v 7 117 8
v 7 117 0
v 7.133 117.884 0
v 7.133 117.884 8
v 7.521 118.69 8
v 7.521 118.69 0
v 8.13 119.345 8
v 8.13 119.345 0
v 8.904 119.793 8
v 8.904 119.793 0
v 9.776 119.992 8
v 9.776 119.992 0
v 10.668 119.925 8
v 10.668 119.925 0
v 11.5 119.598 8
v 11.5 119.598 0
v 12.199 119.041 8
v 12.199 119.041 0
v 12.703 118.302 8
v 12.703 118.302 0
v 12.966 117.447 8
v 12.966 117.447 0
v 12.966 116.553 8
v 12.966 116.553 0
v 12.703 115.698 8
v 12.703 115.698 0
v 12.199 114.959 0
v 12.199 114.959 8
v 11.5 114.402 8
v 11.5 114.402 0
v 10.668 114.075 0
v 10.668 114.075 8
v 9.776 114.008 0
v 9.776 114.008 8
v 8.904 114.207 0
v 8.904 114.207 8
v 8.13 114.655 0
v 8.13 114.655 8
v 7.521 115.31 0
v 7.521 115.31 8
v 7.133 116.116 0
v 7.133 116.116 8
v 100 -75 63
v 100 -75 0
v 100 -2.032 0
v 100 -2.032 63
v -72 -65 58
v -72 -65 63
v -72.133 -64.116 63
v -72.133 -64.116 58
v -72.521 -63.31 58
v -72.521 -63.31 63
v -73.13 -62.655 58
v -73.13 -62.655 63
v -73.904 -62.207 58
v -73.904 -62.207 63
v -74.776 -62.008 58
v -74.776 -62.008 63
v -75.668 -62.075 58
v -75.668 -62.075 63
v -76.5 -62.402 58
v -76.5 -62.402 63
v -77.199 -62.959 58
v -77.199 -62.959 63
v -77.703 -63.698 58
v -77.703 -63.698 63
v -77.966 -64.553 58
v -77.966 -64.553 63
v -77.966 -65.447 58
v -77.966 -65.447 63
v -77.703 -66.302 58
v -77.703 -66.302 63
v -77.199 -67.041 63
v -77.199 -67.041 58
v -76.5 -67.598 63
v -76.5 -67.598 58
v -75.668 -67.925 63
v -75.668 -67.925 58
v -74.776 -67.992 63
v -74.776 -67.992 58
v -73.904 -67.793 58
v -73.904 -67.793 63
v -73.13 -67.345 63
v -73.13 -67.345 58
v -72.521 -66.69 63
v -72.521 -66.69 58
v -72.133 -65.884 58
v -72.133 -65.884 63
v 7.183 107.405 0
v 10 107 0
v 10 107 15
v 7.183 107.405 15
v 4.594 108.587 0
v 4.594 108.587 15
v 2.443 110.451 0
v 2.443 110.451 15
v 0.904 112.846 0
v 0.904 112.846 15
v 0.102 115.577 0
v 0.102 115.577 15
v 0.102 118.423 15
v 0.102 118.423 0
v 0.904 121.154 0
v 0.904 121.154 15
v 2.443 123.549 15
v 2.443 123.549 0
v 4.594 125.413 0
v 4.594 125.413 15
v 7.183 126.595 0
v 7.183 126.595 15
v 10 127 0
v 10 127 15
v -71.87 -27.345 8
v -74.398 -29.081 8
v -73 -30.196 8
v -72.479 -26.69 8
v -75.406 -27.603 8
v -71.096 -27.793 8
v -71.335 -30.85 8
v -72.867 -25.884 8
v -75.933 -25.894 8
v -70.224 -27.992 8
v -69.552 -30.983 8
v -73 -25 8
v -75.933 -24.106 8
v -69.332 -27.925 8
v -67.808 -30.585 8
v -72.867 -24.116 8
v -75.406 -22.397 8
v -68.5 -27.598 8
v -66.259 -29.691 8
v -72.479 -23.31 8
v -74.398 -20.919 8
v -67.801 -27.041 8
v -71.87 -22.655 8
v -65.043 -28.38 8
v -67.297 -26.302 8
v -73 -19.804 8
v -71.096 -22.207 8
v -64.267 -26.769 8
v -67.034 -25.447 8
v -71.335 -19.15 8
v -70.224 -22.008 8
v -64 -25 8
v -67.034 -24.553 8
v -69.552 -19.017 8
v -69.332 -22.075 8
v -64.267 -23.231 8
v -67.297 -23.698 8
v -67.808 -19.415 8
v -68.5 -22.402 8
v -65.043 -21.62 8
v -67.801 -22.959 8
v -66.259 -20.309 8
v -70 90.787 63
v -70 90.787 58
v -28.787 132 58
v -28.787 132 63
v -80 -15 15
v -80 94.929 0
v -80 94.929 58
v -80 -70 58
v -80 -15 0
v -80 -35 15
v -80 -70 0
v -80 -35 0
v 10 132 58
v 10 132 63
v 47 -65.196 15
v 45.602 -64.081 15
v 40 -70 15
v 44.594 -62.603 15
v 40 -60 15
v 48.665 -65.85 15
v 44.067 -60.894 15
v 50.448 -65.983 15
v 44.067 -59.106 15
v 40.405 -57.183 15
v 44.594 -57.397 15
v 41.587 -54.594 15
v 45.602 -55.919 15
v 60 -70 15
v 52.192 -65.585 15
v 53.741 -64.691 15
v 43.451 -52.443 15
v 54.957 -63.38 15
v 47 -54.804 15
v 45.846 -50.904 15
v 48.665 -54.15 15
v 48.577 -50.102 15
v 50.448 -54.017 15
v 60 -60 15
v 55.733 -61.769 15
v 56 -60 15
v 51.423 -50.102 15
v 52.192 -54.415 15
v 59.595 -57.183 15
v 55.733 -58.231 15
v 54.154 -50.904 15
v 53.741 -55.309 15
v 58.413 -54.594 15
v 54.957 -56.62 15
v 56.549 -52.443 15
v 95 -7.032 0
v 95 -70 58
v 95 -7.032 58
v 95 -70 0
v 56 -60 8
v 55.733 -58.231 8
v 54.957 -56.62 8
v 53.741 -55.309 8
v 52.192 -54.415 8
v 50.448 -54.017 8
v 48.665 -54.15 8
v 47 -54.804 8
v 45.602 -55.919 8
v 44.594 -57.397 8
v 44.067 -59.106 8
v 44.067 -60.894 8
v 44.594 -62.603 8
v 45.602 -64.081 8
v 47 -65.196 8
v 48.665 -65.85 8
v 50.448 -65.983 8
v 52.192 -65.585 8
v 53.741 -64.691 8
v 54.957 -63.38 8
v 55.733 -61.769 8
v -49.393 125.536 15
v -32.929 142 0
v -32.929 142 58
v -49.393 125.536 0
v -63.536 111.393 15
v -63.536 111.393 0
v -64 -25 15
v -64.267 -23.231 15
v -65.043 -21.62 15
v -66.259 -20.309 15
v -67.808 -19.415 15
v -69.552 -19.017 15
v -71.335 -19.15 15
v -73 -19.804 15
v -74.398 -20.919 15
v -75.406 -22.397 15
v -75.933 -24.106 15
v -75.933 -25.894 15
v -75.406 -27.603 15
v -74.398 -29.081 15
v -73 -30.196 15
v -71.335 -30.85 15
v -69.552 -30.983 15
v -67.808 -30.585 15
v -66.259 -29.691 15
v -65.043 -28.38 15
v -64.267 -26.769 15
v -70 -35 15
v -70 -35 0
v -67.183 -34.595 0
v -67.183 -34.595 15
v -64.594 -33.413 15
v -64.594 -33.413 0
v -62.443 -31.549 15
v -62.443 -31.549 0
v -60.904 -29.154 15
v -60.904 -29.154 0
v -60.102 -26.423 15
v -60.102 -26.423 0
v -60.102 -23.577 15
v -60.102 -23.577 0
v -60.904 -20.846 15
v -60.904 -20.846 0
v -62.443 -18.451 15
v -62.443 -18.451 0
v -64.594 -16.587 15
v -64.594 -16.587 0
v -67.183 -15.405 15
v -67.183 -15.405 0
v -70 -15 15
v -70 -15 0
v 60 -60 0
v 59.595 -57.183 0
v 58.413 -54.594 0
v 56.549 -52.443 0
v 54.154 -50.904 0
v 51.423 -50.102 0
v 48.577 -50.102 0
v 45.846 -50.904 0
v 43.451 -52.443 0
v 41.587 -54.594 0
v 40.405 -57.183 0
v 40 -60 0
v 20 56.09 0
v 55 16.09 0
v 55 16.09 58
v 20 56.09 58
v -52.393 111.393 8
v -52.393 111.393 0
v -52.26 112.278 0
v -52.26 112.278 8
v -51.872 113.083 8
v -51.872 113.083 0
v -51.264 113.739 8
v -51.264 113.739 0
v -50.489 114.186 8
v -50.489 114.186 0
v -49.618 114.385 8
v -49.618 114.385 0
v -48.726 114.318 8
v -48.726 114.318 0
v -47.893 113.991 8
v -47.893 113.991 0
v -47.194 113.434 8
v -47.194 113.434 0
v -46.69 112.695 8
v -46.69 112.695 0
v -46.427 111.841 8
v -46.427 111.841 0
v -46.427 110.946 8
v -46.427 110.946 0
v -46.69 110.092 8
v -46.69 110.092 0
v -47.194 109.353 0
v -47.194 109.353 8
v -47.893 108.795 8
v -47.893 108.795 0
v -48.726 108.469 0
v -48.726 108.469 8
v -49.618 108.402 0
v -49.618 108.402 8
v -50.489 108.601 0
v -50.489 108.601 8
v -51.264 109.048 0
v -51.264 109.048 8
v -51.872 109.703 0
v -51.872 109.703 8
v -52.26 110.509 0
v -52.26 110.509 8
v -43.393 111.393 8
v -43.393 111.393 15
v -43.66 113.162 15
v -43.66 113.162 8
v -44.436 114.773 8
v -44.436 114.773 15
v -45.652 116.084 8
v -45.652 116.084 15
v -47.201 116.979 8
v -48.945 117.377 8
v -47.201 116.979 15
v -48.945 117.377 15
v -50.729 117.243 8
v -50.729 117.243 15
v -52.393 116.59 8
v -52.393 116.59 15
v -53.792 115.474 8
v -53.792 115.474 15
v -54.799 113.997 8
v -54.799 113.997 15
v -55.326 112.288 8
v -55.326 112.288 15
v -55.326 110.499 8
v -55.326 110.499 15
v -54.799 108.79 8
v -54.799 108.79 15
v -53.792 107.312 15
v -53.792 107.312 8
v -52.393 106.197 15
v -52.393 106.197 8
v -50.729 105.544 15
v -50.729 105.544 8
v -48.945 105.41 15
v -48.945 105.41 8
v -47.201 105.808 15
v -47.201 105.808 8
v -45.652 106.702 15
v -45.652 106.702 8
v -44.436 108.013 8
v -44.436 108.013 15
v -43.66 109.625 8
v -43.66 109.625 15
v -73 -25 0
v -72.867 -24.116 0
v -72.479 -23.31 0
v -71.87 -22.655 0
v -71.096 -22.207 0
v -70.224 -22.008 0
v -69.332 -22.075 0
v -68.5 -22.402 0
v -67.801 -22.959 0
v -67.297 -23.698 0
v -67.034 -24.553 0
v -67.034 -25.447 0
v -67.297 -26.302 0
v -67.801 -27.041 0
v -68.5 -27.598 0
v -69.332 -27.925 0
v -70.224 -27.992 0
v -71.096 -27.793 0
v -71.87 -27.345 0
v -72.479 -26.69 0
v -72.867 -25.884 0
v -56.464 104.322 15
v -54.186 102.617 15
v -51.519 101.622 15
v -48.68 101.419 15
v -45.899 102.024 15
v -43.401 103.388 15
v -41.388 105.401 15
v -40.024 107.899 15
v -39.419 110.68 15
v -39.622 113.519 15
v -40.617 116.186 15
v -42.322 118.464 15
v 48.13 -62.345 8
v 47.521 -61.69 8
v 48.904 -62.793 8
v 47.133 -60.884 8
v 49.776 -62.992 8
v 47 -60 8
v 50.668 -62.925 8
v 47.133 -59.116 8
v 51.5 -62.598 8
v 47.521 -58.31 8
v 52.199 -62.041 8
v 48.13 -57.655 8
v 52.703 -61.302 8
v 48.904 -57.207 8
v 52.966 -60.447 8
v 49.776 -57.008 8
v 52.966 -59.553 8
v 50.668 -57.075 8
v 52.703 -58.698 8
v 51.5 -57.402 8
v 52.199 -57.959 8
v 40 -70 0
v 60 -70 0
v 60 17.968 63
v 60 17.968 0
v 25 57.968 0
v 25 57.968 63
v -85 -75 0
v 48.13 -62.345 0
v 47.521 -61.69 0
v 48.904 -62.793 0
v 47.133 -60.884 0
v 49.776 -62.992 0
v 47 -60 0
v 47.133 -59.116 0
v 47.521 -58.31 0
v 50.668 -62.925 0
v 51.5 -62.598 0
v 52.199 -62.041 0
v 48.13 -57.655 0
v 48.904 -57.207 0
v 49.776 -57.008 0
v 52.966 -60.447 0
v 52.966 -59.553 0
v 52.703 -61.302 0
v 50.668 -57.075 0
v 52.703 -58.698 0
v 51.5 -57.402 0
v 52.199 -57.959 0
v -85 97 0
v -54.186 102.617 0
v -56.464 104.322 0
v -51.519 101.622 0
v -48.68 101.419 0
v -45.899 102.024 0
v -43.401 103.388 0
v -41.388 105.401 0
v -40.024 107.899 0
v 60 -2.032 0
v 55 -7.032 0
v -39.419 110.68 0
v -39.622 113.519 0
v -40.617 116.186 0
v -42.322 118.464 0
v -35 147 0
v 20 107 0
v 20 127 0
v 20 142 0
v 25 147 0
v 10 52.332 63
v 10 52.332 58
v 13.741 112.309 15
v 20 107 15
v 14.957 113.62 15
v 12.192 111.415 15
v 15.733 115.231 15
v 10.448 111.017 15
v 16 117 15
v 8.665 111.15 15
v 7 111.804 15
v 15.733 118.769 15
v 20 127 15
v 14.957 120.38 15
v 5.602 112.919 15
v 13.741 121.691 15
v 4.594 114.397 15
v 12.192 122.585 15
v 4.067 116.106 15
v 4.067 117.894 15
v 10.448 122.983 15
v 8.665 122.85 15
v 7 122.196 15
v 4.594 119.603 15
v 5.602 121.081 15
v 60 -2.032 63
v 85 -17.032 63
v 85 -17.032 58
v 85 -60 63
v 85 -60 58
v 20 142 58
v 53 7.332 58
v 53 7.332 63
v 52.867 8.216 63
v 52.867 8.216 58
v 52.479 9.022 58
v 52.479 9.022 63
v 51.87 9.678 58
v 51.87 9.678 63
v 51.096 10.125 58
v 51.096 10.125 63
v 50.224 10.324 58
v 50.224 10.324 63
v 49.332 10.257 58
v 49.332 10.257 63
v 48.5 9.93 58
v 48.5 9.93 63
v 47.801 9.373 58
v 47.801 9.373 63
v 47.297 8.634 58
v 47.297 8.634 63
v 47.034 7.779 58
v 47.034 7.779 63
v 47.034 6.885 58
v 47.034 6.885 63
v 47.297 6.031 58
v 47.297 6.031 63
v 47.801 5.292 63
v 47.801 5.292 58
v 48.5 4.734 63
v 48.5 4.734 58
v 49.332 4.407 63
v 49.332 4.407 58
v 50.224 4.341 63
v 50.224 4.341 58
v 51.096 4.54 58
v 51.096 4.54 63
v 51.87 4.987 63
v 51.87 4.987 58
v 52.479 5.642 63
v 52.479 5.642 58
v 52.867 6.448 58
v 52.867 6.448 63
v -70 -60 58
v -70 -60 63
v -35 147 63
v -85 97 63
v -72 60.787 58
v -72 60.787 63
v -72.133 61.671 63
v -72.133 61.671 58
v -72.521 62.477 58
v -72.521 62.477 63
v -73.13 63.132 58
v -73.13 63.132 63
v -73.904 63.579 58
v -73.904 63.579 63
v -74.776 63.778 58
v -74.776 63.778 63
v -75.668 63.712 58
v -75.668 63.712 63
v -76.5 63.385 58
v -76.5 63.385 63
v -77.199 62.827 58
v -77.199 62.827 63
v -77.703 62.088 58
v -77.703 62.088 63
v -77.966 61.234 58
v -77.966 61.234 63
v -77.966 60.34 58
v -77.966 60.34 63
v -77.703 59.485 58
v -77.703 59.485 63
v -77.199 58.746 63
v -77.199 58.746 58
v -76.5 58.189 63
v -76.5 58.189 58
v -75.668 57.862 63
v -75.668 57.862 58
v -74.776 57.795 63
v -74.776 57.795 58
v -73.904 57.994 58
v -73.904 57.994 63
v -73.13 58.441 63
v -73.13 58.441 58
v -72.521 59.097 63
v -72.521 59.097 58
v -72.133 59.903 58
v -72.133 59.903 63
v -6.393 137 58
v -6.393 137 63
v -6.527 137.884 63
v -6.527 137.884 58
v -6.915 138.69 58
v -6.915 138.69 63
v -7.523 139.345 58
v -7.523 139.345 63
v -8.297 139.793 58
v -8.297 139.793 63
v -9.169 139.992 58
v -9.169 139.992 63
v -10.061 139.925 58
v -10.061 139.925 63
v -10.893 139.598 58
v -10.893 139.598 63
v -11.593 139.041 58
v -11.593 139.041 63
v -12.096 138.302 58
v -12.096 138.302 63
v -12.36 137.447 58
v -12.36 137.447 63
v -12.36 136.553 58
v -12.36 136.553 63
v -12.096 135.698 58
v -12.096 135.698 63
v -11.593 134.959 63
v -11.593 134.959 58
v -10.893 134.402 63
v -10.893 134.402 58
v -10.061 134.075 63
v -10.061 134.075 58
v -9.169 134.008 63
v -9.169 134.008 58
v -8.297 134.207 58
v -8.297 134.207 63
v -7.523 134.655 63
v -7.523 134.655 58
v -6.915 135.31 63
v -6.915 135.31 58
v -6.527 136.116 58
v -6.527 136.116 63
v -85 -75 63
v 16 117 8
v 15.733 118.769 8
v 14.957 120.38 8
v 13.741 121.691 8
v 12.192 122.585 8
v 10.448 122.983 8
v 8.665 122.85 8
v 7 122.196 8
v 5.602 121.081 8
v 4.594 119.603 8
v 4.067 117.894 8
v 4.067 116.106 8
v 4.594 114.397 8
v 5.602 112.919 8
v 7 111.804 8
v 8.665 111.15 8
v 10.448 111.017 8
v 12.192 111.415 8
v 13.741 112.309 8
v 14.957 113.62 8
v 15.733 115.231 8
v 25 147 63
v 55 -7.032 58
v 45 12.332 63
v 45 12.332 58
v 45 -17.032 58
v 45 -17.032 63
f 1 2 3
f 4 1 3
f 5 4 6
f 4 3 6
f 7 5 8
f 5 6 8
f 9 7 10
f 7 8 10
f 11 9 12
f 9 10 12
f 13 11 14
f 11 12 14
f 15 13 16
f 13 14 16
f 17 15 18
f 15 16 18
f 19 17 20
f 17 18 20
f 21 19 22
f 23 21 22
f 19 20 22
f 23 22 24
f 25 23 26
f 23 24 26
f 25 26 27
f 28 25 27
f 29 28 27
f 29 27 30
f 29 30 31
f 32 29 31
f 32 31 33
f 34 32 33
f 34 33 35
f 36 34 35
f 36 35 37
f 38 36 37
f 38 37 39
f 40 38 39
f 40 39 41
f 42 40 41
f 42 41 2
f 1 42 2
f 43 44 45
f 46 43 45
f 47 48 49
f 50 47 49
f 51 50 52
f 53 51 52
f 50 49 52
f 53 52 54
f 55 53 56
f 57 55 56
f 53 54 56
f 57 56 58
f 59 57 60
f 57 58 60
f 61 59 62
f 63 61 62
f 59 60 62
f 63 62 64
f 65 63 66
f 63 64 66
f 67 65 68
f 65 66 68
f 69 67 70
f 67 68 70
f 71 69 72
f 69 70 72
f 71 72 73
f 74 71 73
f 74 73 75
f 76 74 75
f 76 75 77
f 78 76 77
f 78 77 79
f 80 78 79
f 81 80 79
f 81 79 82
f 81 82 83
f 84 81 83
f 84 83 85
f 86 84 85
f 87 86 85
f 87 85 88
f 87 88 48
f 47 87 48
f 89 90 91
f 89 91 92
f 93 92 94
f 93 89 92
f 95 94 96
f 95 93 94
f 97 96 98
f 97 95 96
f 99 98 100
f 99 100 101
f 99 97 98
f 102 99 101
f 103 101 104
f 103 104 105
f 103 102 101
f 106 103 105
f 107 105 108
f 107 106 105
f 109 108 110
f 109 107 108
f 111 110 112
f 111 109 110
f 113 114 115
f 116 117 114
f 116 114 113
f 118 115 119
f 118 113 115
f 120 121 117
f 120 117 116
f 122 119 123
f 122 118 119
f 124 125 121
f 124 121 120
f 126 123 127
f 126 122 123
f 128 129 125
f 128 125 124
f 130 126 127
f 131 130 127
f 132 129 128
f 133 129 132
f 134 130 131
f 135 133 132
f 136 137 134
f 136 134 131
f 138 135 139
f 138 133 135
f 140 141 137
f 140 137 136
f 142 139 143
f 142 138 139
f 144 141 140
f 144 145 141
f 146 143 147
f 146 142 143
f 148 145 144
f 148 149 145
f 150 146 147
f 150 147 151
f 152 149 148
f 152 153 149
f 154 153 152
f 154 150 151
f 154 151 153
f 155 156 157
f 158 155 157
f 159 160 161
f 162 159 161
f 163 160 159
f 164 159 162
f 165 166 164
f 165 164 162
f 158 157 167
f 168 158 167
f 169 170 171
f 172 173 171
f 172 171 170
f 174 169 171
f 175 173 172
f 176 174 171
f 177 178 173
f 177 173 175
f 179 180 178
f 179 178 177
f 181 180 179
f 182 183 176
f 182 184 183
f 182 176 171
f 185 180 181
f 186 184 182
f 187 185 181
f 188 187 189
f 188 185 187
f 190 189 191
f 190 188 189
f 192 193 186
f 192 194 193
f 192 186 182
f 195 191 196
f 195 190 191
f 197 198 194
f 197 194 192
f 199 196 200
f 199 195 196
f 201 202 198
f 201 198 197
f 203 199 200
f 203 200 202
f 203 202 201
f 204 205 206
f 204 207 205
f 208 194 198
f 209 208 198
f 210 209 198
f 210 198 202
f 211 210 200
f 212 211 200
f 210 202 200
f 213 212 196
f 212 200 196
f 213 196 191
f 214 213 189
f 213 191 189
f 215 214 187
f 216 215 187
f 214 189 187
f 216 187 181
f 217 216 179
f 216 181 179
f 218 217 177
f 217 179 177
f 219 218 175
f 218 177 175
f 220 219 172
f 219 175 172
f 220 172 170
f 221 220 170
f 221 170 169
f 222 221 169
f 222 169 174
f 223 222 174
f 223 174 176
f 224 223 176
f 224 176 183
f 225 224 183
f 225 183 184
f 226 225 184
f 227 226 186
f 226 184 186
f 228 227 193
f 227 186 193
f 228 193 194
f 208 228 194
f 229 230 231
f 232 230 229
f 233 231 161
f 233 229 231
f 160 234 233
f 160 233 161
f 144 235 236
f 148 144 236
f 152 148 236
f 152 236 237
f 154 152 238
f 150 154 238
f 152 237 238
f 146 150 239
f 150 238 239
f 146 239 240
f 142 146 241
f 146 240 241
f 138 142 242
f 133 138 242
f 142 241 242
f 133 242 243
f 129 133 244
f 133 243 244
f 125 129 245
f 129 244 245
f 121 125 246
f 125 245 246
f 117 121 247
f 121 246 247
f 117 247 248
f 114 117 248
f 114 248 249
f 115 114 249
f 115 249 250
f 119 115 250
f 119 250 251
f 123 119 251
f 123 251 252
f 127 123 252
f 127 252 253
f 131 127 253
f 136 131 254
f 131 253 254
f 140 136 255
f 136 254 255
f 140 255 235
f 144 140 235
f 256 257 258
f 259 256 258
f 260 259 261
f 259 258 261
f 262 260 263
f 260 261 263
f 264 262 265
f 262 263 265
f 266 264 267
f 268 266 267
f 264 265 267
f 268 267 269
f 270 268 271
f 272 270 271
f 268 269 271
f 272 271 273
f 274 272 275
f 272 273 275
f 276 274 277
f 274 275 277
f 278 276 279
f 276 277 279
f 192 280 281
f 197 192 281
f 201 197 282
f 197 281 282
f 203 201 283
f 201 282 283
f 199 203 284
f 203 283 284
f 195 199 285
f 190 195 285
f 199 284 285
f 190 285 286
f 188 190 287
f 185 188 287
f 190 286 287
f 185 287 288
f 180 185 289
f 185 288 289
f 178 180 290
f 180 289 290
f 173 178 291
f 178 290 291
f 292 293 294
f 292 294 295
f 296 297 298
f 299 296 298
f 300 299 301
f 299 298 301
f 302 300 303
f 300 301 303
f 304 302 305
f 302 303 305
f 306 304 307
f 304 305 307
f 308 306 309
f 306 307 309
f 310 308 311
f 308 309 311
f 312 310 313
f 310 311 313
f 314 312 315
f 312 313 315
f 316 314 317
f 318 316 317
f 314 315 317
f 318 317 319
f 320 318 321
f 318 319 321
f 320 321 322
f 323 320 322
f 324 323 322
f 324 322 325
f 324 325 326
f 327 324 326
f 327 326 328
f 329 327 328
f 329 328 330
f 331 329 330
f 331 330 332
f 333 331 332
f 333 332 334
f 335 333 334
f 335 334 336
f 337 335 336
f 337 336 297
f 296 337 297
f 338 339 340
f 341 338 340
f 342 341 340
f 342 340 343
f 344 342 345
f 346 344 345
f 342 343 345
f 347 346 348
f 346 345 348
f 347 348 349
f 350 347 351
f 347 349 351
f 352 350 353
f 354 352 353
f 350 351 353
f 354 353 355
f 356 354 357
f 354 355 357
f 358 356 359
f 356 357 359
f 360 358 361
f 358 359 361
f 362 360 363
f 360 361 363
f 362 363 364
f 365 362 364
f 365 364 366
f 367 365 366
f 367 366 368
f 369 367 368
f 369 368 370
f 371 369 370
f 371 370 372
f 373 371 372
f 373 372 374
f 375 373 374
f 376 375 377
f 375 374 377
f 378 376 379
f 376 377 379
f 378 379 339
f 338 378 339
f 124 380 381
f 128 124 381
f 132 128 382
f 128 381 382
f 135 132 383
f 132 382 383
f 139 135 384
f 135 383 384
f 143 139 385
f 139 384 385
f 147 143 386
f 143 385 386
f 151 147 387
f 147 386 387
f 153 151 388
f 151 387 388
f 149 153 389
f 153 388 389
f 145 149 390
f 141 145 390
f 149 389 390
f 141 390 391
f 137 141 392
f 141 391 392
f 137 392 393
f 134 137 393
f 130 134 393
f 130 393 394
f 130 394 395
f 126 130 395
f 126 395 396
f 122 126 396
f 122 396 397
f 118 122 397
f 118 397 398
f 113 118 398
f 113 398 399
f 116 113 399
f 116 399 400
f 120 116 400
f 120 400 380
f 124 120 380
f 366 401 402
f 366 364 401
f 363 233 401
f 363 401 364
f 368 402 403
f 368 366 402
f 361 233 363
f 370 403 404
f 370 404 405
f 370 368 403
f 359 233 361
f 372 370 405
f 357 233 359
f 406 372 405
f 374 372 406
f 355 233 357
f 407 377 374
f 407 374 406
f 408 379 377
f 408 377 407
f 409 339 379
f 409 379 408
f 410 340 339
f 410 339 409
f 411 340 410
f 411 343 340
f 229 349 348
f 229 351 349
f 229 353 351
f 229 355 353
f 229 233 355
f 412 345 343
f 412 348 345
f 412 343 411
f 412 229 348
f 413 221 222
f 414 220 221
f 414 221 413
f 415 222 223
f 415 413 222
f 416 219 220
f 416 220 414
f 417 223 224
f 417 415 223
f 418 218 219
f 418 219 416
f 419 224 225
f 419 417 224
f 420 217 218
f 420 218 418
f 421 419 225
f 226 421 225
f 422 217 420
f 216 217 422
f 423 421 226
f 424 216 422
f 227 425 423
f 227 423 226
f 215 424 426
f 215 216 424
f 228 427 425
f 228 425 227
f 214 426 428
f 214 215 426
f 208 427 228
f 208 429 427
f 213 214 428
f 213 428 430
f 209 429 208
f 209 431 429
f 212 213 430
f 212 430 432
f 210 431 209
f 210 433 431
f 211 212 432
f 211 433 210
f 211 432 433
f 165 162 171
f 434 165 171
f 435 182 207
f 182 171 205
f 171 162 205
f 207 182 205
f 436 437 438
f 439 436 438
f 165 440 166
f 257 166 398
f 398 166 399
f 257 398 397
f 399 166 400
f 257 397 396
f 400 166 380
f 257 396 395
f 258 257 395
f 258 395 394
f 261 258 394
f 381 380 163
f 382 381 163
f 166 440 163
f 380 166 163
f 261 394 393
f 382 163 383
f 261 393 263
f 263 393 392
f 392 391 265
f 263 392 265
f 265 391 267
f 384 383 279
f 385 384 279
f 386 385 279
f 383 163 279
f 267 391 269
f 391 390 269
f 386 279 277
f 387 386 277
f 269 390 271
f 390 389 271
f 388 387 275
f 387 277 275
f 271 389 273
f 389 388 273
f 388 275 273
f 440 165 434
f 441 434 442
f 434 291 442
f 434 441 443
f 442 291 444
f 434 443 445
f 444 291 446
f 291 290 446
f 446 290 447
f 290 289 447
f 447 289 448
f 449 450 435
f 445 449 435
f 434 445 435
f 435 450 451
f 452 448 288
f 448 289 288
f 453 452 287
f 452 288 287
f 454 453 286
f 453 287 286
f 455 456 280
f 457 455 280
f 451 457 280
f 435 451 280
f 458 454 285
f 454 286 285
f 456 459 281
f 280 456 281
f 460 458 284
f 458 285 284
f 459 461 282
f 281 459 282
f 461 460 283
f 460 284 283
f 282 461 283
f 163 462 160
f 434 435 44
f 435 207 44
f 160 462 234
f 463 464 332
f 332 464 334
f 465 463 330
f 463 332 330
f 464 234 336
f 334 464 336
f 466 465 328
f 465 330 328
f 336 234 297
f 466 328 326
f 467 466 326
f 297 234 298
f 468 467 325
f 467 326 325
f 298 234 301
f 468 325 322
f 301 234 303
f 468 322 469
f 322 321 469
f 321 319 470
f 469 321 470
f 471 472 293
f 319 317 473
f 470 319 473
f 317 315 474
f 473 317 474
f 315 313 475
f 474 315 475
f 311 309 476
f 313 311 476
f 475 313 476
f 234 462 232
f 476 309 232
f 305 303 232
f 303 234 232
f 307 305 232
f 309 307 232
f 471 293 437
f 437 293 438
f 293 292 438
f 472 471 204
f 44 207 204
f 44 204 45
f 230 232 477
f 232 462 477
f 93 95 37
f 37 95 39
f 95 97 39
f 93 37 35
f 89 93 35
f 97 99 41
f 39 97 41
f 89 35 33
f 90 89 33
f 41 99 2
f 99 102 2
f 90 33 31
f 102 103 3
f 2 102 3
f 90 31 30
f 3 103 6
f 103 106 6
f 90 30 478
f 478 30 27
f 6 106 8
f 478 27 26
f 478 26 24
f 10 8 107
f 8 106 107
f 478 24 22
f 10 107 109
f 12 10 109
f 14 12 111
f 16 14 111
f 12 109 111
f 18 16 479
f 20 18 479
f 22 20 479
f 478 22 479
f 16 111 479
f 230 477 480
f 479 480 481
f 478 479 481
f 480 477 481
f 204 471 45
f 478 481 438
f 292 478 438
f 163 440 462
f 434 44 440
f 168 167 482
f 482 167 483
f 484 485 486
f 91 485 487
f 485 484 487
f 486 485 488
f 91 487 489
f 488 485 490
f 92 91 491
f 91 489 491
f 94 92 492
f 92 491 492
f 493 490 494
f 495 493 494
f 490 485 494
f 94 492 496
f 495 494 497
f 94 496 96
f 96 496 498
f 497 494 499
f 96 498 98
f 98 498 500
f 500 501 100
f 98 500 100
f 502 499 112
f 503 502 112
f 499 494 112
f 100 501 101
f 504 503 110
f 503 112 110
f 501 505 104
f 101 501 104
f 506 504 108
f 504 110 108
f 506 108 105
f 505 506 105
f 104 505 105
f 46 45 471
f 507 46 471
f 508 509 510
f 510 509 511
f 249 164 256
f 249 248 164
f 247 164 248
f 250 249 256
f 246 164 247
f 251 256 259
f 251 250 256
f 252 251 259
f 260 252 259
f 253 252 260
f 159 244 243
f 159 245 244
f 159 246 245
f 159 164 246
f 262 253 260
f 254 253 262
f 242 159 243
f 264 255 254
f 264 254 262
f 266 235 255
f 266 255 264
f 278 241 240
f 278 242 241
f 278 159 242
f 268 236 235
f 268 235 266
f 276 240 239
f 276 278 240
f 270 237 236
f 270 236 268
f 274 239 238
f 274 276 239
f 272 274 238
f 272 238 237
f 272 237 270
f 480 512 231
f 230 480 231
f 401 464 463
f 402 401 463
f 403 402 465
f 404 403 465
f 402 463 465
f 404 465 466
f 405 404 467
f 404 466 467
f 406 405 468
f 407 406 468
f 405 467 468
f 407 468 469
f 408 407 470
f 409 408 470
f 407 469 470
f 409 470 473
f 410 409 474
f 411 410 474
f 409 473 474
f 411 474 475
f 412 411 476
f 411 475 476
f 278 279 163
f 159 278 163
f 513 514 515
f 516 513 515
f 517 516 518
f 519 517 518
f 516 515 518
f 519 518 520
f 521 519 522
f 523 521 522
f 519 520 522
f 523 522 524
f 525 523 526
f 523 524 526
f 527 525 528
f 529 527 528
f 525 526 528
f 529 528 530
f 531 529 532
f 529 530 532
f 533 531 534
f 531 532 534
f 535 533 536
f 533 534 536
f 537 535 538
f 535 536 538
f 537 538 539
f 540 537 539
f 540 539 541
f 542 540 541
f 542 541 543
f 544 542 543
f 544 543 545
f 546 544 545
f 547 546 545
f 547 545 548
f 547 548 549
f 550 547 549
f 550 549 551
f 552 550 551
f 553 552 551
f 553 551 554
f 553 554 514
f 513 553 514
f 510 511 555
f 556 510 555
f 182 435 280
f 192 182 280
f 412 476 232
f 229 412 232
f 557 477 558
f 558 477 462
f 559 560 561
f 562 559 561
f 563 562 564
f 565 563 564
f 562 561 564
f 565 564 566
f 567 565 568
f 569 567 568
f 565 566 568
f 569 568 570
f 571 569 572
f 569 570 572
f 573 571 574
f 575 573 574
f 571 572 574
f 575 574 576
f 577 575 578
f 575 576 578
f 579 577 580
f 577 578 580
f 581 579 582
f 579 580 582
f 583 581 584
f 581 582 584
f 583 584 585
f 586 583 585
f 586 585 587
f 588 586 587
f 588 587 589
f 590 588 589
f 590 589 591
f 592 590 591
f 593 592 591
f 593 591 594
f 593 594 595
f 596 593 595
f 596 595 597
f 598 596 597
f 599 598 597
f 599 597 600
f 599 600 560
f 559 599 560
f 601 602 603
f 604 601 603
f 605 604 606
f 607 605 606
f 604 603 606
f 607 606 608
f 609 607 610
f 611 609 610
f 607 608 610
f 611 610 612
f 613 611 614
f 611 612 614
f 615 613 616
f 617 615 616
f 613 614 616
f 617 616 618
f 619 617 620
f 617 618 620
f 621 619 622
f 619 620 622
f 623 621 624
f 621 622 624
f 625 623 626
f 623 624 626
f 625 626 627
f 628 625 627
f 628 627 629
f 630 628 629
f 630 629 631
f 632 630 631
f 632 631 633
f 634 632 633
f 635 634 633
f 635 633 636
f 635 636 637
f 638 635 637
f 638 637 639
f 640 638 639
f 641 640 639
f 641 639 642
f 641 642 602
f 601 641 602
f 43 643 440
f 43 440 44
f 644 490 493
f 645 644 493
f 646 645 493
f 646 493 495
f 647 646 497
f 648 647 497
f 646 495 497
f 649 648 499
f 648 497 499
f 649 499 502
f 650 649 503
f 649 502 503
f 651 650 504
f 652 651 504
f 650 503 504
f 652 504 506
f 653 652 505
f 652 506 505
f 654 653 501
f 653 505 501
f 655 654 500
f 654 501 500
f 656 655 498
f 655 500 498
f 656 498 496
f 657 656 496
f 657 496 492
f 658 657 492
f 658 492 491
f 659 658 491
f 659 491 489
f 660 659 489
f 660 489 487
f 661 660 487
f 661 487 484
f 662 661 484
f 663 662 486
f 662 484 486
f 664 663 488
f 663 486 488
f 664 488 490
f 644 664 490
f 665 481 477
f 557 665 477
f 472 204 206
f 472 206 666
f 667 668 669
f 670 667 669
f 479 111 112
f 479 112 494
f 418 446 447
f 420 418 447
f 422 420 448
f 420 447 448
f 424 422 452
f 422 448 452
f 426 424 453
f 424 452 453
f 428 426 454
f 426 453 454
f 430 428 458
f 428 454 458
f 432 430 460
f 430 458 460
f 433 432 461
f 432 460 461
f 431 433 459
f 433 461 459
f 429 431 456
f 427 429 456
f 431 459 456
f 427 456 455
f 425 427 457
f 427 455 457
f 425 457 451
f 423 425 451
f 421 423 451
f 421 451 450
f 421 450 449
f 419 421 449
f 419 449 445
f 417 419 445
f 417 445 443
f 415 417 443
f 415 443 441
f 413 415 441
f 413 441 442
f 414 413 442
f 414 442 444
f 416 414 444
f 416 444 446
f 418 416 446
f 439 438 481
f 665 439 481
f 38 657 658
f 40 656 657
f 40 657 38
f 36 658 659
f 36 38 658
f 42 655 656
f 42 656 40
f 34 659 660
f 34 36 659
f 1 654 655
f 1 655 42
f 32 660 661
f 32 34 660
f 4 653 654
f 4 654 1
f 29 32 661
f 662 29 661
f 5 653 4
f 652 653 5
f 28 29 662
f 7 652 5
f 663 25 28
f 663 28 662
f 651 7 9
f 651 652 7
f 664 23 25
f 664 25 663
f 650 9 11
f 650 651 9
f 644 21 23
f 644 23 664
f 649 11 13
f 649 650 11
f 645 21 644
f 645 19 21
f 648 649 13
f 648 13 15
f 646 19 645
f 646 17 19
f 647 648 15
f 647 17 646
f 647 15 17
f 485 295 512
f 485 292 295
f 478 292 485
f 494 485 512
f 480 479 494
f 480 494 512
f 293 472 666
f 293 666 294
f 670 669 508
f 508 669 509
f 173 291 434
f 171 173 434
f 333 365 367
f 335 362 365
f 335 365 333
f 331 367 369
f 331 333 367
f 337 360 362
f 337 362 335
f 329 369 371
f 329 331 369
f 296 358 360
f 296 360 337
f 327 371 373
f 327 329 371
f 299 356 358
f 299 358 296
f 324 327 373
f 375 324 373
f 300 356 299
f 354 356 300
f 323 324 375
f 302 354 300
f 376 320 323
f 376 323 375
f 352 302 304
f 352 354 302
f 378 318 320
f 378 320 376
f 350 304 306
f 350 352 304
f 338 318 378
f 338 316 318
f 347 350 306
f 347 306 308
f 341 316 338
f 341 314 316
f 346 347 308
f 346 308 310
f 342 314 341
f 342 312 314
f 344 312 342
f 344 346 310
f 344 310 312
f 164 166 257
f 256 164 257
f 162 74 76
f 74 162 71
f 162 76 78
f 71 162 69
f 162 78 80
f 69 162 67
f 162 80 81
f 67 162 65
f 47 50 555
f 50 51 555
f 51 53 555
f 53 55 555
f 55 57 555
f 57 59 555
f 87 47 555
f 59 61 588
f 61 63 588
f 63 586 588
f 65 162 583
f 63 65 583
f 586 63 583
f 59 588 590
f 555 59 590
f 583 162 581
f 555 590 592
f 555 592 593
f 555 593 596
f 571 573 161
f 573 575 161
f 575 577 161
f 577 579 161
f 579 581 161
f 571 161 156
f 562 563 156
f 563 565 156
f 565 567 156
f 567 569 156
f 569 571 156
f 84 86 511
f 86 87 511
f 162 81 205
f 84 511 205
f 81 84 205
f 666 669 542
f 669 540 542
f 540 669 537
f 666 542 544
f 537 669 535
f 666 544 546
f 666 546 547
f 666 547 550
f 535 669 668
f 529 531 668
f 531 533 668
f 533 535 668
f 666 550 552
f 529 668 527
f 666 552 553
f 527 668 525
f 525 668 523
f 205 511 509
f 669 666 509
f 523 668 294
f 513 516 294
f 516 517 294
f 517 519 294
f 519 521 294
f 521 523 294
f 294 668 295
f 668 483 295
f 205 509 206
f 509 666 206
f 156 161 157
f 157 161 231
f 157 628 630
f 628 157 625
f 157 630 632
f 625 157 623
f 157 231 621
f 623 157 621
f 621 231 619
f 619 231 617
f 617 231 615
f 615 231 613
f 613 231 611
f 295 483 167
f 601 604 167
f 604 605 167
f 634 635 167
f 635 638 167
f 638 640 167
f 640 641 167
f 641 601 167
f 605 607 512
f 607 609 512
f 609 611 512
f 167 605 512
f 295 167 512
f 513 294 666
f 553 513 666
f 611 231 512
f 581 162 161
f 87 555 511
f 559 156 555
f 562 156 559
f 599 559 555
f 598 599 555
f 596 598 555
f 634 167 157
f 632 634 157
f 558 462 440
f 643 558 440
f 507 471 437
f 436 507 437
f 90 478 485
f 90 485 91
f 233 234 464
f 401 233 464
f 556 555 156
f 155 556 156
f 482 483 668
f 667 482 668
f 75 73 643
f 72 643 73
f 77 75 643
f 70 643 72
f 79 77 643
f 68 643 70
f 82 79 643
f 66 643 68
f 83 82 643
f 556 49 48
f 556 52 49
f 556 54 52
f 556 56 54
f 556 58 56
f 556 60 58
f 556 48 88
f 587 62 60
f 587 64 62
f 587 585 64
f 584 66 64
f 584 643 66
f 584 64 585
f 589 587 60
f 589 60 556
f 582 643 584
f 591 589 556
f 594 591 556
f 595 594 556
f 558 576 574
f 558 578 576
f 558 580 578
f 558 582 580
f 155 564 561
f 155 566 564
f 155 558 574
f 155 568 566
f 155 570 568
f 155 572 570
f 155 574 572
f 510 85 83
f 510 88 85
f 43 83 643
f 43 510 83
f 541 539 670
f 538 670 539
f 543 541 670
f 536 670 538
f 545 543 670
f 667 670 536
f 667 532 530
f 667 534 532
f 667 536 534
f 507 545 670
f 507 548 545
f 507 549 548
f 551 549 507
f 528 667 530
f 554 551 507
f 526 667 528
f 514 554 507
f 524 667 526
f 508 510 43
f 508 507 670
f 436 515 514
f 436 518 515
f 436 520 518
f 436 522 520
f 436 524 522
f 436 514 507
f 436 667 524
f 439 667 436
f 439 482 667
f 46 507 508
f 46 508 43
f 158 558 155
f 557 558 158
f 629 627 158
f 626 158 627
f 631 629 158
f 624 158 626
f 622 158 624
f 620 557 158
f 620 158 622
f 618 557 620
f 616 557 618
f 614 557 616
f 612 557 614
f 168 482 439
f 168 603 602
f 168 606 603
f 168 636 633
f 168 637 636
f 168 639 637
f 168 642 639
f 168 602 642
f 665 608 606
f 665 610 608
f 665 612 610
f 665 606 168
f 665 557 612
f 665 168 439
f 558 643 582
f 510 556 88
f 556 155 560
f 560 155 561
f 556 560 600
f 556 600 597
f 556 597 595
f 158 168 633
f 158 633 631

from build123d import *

# Parameters (mm, degrees)
EXTRUDE_1_DEPTH     = 63
SKETCH_2_W          = 185
SKETCH_2_H          = 5
CUT_EXTRUDE_1_DEPTH = 114
SHELL_1_T           = -5
CUT_EXTRUDE_2_DEPTH = 10
EXTRUDE_2_DEPTH     = 15
SKETCH_5_R          = 3
CUT_EXTRUDE_3_DEPTH = 35
SKETCH_6_R          = 6
CUT_EXTRUDE_4_DEPTH = 7
SKETCH_8_R          = 3
CUT_EXTRUDE_5_DEPTH = 10


with BuildPart() as part:
    # 草图1 → 凸台-拉伸1 (new body)
    with BuildSketch(Plane.XY):
        Polygon((100, -2.031815791), (60, -2.031815791), (60, 17.968184209), (25, 57.968184209), (25, 147), (-35, 147), (-85, 97), (-85, -80), (100, -80), align=None)
    extrude(amount=EXTRUDE_1_DEPTH)

    # 草图2 → 切除-拉伸1 (cut)
    with BuildSketch(Plane.XY.offset(63)):
        with Locations((7.5, -77.5)):
            Rectangle(SKETCH_2_W, SKETCH_2_H)
    extrude(amount=-CUT_EXTRUDE_1_DEPTH, mode=Mode.SUBTRACT)

    # 抽壳1
    shell_1_openings = [part.faces().sort_by_distance(p)[0] for p in [
        (18.333333333, 34.763637426, 0),
    ]]
    offset(amount=SHELL_1_T, openings=shell_1_openings, kind=Kind.INTERSECTION)

    # 草图3 → 切除-拉伸2 (cut)
    with BuildSketch(Plane(origin=(0, 0, 58), x_dir=(-1, 0, 0), z_dir=(0, 0, -1))):
        Polygon((-85, -60), (70, -60), (70, 90.786796564), (28.786796564, 132), (-10, 132), (-10, 52.332157467), (-45, 12.332157467), (-45, -17.031815791), (-85, -17.031815791), align=None)
    extrude(amount=-CUT_EXTRUDE_2_DEPTH, mode=Mode.SUBTRACT)

    # 草图4 → 凸台-拉伸2 (add)
    with BuildSketch(Plane(origin=(0, 0, 0), x_dir=(-1, 0, 0), z_dir=(0, 0, -1))):
        with BuildLine():
            Line((63.535533906, 111.393398282), (56.464466094, 104.32233047))
            ThreePointArc((56.464466094, 104.32233047), (42.32233047, 104.32233047), (42.32233047, 118.464466094))
            Line((42.32233047, 118.464466094), (49.393398282, 125.535533906))
            Line((49.393398282, 125.535533906), (63.535533906, 111.393398282))
        make_face()
        with BuildLine():
            Line((70, -15), (80, -15))
            Line((80, -15), (80, -35))
            Line((80, -35), (70, -35))
            ThreePointArc((70, -35), (60, -25), (70, -15))
        make_face()
        with BuildLine():
            Line((-40, -60), (-40, -70))
            Line((-40, -70), (-60, -70))
            Line((-60, -70), (-60, -60))
            ThreePointArc((-60, -60), (-50, -50), (-40, -60))
        make_face()
        with BuildLine():
            Line((-10, 127), (-20, 127))
            Line((-20, 127), (-20, 107))
            Line((-20, 107), (-10, 107))
            ThreePointArc((-10, 107), (0, 117), (-10, 127))
        make_face()
    extrude(amount=-EXTRUDE_2_DEPTH)

    # 草图5 → 切除-拉伸3 (cut)
    with BuildSketch(Plane(origin=(0, 0, 0), x_dir=(-1, 0, 0), z_dir=(0, 0, -1))):
        with Locations((49.393398282, 111.393398282)):
            Circle(SKETCH_5_R)
        with Locations((-10, 117)):
            Circle(SKETCH_5_R)
        with Locations((70, -25)):
            Circle(SKETCH_5_R)
        with Locations((-50, -60)):
            Circle(SKETCH_5_R)
    extrude(amount=-CUT_EXTRUDE_3_DEPTH, mode=Mode.SUBTRACT)

    # 草图6 → 切除-拉伸4 (cut)
    with BuildSketch(Plane.XY.offset(15)):
        with Locations((10, 117)):
            Circle(SKETCH_6_R)
        with Locations((-49.393398282, 111.393398282)):
            Circle(SKETCH_6_R)
        with Locations((50, -60)):
            Circle(SKETCH_6_R)
        with Locations((-70, -25)):
            Circle(SKETCH_6_R)
    extrude(amount=-CUT_EXTRUDE_4_DEPTH, mode=Mode.SUBTRACT)

    # 草图8 → 切除-拉伸5 (cut)
    with BuildSketch(Plane.XY.offset(63)):
        with Locations((-9.393398282, 137)):
            Circle(SKETCH_8_R)
        with Locations((-75, -65)):
            Circle(SKETCH_8_R)
        with Locations((-75, 60.786796564)):
            Circle(SKETCH_8_R)
        with Locations((50, 7.332157467)):
            Circle(SKETCH_8_R)
    extrude(amount=-CUT_EXTRUDE_5_DEPTH, mode=Mode.SUBTRACT)


solid = part.part
